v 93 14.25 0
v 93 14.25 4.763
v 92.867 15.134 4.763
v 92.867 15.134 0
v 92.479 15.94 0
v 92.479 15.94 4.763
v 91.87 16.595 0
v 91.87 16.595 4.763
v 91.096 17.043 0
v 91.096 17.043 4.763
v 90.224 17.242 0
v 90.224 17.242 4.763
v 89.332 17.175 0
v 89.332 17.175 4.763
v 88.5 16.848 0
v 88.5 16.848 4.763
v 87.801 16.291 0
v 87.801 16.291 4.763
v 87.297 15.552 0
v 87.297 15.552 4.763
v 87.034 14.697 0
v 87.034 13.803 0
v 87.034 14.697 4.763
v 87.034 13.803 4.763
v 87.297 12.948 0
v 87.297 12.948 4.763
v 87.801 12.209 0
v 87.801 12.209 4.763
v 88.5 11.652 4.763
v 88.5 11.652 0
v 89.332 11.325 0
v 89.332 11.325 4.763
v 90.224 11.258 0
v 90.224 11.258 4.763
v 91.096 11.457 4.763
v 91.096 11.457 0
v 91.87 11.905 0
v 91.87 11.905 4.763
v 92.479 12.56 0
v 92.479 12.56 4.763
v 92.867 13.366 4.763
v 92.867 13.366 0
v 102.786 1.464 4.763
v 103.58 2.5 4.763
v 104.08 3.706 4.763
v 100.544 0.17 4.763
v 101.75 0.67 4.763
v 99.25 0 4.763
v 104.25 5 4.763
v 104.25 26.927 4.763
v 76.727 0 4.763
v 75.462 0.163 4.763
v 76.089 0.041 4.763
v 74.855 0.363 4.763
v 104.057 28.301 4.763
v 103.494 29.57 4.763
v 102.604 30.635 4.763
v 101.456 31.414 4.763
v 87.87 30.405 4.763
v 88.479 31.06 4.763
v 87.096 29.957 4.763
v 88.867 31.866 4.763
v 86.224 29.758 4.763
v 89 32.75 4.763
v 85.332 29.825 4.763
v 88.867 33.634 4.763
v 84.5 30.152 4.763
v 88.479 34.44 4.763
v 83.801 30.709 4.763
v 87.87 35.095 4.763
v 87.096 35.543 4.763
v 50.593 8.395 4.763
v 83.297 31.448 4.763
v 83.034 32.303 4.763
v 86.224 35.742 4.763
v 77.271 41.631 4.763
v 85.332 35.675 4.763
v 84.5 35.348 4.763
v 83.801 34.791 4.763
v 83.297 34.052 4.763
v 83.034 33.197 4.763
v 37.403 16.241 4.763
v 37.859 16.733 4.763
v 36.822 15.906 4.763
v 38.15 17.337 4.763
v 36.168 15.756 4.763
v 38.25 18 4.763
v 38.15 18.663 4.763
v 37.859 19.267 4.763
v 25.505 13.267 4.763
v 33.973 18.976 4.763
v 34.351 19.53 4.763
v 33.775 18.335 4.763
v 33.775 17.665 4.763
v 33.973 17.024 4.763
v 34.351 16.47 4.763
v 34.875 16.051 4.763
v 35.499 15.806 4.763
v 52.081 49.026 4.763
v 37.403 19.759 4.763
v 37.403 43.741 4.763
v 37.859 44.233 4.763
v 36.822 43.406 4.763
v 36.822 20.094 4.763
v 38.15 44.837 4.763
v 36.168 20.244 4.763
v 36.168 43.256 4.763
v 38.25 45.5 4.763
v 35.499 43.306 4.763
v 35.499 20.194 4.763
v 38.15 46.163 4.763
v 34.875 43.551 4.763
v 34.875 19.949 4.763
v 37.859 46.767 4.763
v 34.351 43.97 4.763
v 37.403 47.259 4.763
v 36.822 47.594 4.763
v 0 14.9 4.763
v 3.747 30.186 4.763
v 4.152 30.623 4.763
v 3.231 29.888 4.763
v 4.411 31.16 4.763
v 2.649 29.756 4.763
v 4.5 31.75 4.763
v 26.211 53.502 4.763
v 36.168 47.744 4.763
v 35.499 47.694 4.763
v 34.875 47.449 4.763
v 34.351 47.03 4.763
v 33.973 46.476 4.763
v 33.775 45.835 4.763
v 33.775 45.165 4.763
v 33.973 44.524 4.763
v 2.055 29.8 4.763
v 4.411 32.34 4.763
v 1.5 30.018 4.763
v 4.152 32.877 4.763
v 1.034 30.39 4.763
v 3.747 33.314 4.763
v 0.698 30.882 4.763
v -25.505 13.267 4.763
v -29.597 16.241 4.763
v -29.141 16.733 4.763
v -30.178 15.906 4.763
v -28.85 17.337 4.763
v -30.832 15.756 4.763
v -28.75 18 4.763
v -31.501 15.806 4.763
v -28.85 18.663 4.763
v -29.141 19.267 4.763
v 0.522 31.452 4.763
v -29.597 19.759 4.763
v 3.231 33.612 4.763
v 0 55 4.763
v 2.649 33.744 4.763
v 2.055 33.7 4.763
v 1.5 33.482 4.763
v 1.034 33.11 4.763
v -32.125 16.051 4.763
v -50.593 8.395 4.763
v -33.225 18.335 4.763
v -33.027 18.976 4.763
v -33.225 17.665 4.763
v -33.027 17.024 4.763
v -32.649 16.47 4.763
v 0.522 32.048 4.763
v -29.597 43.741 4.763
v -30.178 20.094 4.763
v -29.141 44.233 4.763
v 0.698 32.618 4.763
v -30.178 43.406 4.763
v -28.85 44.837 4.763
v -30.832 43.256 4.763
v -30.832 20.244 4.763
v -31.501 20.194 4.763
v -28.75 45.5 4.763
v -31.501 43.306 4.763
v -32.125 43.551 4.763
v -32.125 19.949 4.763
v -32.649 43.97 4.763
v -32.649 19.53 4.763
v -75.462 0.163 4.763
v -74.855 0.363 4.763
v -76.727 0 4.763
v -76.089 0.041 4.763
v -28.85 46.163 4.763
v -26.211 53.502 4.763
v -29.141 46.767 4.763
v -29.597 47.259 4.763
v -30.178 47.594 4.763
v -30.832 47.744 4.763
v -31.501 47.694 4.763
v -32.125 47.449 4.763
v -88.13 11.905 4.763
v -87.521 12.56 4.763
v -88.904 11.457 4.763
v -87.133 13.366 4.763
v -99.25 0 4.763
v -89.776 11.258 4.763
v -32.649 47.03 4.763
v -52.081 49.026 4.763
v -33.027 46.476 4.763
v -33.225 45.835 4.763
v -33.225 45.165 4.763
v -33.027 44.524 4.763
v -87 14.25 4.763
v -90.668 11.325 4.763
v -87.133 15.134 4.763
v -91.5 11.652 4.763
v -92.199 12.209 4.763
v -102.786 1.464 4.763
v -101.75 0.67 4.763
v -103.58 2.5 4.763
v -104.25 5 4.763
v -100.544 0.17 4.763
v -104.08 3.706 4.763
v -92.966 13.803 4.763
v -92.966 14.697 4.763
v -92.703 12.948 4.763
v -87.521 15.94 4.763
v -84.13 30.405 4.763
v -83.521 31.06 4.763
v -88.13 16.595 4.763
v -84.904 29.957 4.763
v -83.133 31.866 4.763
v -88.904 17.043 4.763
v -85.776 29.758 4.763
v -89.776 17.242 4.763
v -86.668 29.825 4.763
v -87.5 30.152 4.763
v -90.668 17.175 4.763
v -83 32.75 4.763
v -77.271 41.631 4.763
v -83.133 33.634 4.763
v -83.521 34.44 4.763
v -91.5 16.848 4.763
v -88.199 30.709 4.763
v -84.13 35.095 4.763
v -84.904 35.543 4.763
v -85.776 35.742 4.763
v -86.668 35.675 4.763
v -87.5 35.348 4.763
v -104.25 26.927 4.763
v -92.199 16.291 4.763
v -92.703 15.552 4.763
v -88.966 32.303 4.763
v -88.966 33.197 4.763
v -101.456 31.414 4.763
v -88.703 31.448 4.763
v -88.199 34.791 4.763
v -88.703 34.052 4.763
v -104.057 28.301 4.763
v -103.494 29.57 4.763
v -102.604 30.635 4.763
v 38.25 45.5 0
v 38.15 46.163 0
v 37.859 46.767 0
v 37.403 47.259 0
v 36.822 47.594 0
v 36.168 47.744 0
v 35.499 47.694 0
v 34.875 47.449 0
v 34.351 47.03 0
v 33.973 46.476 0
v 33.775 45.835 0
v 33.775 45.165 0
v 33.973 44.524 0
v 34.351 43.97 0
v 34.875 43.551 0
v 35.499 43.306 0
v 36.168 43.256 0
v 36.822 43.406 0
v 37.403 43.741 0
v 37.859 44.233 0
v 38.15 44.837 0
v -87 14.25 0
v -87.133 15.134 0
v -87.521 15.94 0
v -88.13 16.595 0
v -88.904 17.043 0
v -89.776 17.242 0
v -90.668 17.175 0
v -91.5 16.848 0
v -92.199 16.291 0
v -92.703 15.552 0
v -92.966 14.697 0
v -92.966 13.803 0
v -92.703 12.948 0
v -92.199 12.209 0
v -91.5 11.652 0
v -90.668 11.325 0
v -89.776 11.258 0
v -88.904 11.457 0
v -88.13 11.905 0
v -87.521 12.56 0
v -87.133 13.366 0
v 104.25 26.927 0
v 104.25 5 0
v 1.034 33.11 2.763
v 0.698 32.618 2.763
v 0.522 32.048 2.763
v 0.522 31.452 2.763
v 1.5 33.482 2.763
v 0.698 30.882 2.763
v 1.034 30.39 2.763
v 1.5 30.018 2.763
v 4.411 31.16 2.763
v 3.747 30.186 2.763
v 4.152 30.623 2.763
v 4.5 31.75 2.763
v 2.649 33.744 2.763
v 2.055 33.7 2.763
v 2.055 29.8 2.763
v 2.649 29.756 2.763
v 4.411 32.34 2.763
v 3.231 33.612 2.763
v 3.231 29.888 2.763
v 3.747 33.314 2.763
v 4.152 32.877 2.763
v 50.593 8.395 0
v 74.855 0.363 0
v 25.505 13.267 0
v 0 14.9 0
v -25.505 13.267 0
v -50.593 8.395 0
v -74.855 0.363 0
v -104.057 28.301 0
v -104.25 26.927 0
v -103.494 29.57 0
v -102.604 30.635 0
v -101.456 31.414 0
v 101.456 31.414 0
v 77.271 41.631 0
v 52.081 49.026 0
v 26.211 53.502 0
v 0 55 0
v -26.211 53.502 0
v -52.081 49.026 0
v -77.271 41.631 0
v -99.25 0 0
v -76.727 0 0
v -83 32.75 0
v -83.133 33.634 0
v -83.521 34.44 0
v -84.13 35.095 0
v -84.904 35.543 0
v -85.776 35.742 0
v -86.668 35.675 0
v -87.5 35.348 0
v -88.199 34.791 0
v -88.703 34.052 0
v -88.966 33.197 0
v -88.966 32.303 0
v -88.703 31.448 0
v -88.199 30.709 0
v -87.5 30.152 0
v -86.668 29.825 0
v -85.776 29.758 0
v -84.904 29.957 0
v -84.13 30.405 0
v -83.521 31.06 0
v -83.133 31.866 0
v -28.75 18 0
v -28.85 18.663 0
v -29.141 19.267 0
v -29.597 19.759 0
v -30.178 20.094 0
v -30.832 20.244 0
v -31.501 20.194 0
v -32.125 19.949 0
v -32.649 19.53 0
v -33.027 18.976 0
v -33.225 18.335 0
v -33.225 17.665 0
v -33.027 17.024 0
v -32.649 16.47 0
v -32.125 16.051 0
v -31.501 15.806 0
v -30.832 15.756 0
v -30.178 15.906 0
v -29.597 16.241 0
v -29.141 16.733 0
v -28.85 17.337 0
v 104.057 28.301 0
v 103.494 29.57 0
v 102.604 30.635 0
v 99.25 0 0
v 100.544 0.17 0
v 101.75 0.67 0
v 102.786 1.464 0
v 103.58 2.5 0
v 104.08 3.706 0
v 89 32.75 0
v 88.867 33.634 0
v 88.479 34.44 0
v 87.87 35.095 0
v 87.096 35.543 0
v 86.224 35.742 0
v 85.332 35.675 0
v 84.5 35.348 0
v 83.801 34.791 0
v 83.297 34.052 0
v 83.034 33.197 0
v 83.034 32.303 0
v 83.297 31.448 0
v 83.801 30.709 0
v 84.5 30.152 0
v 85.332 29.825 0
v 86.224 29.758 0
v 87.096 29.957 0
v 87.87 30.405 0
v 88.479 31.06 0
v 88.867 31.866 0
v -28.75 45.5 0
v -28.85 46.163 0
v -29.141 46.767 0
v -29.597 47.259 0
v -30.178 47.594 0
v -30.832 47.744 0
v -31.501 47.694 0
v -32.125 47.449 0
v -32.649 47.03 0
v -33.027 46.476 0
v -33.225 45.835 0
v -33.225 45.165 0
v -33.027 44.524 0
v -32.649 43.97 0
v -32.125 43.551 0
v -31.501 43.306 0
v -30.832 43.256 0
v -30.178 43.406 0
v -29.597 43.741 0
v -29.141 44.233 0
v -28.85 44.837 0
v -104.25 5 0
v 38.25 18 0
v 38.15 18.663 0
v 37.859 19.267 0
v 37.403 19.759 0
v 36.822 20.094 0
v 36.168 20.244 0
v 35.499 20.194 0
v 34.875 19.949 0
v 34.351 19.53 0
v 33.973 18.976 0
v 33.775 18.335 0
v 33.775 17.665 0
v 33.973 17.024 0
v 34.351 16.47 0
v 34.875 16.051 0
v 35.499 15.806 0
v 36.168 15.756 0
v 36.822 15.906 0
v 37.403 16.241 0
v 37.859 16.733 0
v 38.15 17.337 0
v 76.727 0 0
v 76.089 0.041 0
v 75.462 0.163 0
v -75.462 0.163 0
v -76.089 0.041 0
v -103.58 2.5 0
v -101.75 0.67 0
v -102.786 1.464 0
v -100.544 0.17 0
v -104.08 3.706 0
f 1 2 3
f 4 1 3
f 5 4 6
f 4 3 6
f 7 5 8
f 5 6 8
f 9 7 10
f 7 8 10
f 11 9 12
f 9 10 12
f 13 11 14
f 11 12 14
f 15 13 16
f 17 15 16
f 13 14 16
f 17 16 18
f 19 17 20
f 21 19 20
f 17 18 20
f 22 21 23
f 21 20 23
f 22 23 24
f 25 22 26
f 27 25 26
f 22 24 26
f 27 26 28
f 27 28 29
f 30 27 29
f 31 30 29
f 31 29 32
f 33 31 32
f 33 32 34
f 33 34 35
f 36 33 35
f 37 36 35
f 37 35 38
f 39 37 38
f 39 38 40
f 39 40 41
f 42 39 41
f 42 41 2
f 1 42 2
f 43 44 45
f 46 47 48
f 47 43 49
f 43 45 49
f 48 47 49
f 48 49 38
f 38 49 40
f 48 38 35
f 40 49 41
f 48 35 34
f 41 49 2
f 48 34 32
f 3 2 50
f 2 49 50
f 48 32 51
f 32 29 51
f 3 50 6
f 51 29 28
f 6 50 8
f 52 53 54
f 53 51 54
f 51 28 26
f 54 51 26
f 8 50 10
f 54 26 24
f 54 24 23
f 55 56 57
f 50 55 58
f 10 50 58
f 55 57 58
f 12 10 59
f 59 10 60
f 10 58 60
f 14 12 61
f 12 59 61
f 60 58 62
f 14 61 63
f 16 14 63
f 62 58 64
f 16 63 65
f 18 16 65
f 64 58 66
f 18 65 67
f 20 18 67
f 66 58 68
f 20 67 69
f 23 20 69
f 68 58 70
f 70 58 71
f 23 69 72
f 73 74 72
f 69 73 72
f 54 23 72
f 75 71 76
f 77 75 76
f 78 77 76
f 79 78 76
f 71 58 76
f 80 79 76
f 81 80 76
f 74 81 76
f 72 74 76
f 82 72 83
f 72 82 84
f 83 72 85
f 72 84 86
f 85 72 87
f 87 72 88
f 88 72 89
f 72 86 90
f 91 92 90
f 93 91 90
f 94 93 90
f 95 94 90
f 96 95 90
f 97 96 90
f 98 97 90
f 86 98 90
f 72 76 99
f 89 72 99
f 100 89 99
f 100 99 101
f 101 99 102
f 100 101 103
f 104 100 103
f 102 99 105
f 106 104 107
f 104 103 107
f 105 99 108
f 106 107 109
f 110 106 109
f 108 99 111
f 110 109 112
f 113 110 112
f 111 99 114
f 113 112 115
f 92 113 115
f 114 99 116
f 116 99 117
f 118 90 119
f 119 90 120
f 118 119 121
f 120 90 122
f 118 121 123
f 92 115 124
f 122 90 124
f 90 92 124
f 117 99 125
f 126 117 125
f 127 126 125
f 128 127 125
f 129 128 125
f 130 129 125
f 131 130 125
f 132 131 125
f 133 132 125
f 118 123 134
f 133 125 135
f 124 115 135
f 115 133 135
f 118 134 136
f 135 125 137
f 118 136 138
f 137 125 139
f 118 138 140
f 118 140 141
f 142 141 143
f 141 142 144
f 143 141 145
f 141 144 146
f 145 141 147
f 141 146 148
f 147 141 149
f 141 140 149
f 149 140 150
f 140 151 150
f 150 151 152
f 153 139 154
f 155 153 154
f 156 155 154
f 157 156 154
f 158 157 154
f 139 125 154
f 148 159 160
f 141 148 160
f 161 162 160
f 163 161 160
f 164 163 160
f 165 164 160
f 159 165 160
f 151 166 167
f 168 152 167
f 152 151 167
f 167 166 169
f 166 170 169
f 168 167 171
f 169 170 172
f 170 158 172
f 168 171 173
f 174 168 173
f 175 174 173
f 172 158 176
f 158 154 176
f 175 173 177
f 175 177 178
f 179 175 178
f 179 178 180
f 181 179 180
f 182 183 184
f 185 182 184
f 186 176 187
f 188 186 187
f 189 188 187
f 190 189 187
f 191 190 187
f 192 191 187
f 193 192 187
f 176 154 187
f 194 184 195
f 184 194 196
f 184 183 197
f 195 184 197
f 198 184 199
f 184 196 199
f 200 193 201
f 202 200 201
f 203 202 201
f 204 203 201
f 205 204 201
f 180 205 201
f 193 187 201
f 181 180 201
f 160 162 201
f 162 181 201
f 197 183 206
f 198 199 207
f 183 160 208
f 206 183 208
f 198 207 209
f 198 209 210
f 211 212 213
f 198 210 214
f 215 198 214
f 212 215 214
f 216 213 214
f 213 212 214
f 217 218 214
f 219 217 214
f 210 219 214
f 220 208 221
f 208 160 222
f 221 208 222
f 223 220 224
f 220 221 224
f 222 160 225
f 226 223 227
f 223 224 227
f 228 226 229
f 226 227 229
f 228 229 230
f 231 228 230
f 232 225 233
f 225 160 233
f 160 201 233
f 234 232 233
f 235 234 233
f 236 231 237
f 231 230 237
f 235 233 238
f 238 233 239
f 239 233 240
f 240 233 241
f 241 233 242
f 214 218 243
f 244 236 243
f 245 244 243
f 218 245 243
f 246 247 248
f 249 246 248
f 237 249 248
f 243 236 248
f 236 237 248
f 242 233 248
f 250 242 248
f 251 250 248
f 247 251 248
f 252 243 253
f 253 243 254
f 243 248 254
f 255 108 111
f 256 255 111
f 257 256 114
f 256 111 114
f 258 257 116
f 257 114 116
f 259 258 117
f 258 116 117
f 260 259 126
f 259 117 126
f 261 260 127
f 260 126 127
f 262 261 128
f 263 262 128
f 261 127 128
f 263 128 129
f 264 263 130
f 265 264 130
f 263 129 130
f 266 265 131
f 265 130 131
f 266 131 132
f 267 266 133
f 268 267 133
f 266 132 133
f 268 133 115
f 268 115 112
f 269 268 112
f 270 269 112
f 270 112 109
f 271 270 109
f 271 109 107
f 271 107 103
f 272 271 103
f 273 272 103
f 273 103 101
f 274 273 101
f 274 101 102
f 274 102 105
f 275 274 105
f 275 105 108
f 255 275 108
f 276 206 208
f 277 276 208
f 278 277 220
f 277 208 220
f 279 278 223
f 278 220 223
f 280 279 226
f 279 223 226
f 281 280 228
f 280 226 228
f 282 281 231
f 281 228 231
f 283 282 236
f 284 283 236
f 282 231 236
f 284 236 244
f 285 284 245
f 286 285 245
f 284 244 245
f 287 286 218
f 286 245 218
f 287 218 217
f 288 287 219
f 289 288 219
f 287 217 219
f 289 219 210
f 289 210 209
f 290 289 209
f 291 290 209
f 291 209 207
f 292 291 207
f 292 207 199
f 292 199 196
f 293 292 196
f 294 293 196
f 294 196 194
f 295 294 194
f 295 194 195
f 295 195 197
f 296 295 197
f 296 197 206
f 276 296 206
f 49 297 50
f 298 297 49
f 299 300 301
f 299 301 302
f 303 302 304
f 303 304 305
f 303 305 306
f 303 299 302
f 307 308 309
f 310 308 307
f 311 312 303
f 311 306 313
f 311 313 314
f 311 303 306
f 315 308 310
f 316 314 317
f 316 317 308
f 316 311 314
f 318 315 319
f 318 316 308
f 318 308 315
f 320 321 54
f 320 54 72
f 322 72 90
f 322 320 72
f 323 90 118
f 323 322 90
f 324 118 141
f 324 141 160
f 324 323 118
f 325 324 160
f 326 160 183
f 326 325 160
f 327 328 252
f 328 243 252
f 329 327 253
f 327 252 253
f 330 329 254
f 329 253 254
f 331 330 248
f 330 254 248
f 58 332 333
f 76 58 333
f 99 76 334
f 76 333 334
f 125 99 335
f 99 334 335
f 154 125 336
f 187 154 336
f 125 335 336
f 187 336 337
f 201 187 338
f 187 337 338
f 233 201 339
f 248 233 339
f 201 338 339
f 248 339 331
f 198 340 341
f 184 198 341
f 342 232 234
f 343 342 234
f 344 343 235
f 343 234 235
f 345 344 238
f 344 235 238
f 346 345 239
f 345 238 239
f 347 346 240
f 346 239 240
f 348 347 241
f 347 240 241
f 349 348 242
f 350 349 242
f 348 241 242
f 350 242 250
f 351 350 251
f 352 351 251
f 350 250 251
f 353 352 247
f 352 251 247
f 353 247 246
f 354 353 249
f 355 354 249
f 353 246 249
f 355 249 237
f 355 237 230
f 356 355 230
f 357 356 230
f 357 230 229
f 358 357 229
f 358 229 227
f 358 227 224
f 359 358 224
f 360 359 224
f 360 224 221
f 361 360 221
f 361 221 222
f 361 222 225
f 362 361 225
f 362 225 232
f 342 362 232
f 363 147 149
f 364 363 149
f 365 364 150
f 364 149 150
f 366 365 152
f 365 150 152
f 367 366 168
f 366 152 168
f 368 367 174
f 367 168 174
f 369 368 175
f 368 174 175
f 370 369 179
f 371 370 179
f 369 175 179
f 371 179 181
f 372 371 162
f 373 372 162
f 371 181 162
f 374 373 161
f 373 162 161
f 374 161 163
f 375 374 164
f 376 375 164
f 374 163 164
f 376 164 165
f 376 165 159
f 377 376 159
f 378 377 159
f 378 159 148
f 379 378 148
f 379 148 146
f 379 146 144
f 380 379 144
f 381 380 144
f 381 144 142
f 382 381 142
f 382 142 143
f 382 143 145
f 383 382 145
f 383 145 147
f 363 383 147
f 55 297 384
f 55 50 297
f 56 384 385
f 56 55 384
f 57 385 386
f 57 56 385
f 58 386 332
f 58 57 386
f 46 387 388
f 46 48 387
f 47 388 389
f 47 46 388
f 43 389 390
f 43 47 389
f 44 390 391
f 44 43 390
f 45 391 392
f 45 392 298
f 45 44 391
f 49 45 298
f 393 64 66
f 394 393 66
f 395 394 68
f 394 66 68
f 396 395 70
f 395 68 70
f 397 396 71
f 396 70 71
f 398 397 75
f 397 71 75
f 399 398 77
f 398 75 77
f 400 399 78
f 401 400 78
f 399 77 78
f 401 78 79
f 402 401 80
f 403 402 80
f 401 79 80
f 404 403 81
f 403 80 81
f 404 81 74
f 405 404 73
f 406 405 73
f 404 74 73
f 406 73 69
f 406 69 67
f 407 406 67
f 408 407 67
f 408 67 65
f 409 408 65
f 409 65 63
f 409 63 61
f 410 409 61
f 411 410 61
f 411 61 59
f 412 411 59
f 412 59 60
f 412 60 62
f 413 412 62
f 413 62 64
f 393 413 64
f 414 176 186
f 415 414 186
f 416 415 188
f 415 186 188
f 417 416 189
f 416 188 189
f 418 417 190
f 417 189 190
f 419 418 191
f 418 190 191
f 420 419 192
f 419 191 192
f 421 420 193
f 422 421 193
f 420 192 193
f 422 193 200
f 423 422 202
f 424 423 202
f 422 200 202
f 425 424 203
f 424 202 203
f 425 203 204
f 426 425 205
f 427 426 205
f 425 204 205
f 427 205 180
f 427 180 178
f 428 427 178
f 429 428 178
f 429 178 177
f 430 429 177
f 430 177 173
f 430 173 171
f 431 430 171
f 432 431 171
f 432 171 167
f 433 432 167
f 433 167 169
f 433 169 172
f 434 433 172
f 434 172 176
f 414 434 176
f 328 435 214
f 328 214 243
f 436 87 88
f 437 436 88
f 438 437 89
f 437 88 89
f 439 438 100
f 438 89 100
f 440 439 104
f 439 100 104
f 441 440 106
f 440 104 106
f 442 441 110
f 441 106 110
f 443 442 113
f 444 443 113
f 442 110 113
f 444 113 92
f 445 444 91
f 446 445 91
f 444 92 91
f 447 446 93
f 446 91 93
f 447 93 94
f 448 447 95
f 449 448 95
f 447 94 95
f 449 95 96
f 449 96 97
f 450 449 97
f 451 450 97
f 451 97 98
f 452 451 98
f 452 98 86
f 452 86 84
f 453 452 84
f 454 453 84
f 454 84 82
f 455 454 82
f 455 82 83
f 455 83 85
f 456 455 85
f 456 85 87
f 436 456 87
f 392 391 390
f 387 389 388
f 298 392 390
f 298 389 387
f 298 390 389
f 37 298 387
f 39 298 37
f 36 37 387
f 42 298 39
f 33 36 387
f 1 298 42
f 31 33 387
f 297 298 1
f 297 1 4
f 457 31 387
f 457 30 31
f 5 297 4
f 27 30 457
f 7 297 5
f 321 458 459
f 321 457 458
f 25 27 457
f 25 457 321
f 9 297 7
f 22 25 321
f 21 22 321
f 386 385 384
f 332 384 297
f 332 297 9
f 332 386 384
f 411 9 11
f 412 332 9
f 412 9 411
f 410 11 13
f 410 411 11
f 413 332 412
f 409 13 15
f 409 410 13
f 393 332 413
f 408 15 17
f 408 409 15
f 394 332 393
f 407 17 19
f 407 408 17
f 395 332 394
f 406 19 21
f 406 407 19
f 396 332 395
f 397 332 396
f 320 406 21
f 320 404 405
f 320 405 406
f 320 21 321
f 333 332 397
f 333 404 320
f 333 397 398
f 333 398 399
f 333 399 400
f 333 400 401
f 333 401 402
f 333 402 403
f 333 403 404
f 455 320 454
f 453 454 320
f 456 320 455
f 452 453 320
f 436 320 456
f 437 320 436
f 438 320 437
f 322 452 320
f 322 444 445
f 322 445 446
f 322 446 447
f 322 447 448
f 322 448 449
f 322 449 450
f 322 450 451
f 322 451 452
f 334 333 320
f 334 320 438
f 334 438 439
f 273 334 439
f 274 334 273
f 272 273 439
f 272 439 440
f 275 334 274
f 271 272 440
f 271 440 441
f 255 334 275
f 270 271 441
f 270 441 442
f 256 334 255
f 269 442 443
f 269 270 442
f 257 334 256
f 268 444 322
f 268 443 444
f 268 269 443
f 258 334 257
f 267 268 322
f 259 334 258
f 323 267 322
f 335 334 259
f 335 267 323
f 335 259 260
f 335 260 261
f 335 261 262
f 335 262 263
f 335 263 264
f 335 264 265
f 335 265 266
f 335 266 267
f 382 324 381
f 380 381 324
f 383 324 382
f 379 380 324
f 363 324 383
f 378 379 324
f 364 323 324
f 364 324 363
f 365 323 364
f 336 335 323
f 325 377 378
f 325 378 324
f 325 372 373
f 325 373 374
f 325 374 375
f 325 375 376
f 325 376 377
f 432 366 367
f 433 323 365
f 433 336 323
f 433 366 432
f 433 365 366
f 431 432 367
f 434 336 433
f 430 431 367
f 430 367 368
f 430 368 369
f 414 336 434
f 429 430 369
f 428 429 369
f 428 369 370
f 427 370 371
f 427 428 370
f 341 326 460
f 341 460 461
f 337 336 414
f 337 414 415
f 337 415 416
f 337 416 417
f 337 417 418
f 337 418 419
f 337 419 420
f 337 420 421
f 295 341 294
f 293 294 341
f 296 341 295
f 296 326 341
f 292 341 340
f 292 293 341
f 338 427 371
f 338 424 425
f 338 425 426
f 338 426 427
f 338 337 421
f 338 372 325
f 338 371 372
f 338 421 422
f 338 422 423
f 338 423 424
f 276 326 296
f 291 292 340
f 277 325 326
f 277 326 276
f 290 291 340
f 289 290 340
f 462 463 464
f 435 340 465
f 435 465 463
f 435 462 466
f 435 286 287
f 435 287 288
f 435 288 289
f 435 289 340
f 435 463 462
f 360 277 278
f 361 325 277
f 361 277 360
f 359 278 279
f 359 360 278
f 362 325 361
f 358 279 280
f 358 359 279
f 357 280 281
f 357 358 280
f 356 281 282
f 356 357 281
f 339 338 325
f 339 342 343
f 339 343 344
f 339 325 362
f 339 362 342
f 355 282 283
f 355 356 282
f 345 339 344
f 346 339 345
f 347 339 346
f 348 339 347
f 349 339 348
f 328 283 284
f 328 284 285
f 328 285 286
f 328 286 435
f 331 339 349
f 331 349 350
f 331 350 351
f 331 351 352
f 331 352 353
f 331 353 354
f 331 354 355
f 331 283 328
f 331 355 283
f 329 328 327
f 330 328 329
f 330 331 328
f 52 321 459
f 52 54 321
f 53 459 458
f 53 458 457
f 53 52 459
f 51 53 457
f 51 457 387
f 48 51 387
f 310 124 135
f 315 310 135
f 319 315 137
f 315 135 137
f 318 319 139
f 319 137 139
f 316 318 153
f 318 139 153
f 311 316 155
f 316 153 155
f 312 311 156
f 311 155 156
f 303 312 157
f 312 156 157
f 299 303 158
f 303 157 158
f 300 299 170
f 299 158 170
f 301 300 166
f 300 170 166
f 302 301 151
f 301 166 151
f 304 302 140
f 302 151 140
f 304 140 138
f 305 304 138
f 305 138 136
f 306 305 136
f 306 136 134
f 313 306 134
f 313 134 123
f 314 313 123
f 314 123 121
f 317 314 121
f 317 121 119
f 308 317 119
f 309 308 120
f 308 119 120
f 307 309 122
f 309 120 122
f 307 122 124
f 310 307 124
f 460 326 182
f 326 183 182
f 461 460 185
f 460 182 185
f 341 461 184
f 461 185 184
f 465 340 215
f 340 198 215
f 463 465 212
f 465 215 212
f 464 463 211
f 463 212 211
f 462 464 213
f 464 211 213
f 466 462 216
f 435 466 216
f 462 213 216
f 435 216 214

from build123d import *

# Parameters (mm, degrees)
PAD_DEPTH       = 4.763
SKETCH001_R     = 2.25
SKETCH001_R_2   = 3
POCKET_DEPTH    = 4.764
FILLET_R        = 5
SKETCH003_R     = 2
POCKET001_DEPTH = 2


with BuildPart() as part:
    # Sketch → Pad (new body)
    with BuildSketch(Plane.XY):
        with BuildLine():
            ThreePointArc((75.749521, 0), (0, 14.9), (-75.749521, 0))
            Line((-104.25, 0), (-75.749521, 0))
            Line((-104.25, 0), (-104.25, 30.01692))
            ThreePointArc((104.25, 30.01692), (0, 55), (-104.25, 30.01692))
            Line((104.25, 30.01692), (104.25, 0))
            Line((75.749521, 0), (104.25, 0))
        make_face()
    extrude(amount=PAD_DEPTH)

    # Sketch001 (on Face8 of Pad) → Pocket (cut, through all)
    with BuildSketch(Plane.XY.offset(4.763)):
        with Locations((-31, 45.5)):
            Circle(SKETCH001_R)
        with Locations((36, 45.5)):
            Circle(SKETCH001_R)
        with Locations((36, 18)):
            Circle(SKETCH001_R)
        with Locations((-31, 18)):
            Circle(SKETCH001_R)
        with Locations((-90, 14.25)):
            Circle(SKETCH001_R_2)
        with Locations((-86, 32.75)):
            Circle(SKETCH001_R_2)
        with Locations((86, 32.75)):
            Circle(SKETCH001_R_2)
        with Locations((90, 14.25)):
            Circle(SKETCH001_R_2)
    extrude(amount=-POCKET_DEPTH, mode=Mode.SUBTRACT)

    # Fillet
    fillet_edges = [part.edges().sort_by_distance(p)[0] for p in [
        (-104.25, 30.01692, 2.3815),
        (-104.25, 0, 2.3815),
        (104.25, 30.01692, 2.3815),
        (-75.749521, 0, 2.3815),
        (75.749521, 0, 2.3815),
        (104.25, 0, 2.3815),
    ]]
    fillet(fillet_edges, radius=FILLET_R)

    # Sketch003 (on Face5 of Fillet) → Pocket001 (cut)
    with BuildSketch(Plane.XY.offset(4.763)):
        with Locations((2.5, 31.75)):
            Circle(SKETCH003_R)
    extrude(amount=-POCKET001_DEPTH, mode=Mode.SUBTRACT)


solid = part.part
